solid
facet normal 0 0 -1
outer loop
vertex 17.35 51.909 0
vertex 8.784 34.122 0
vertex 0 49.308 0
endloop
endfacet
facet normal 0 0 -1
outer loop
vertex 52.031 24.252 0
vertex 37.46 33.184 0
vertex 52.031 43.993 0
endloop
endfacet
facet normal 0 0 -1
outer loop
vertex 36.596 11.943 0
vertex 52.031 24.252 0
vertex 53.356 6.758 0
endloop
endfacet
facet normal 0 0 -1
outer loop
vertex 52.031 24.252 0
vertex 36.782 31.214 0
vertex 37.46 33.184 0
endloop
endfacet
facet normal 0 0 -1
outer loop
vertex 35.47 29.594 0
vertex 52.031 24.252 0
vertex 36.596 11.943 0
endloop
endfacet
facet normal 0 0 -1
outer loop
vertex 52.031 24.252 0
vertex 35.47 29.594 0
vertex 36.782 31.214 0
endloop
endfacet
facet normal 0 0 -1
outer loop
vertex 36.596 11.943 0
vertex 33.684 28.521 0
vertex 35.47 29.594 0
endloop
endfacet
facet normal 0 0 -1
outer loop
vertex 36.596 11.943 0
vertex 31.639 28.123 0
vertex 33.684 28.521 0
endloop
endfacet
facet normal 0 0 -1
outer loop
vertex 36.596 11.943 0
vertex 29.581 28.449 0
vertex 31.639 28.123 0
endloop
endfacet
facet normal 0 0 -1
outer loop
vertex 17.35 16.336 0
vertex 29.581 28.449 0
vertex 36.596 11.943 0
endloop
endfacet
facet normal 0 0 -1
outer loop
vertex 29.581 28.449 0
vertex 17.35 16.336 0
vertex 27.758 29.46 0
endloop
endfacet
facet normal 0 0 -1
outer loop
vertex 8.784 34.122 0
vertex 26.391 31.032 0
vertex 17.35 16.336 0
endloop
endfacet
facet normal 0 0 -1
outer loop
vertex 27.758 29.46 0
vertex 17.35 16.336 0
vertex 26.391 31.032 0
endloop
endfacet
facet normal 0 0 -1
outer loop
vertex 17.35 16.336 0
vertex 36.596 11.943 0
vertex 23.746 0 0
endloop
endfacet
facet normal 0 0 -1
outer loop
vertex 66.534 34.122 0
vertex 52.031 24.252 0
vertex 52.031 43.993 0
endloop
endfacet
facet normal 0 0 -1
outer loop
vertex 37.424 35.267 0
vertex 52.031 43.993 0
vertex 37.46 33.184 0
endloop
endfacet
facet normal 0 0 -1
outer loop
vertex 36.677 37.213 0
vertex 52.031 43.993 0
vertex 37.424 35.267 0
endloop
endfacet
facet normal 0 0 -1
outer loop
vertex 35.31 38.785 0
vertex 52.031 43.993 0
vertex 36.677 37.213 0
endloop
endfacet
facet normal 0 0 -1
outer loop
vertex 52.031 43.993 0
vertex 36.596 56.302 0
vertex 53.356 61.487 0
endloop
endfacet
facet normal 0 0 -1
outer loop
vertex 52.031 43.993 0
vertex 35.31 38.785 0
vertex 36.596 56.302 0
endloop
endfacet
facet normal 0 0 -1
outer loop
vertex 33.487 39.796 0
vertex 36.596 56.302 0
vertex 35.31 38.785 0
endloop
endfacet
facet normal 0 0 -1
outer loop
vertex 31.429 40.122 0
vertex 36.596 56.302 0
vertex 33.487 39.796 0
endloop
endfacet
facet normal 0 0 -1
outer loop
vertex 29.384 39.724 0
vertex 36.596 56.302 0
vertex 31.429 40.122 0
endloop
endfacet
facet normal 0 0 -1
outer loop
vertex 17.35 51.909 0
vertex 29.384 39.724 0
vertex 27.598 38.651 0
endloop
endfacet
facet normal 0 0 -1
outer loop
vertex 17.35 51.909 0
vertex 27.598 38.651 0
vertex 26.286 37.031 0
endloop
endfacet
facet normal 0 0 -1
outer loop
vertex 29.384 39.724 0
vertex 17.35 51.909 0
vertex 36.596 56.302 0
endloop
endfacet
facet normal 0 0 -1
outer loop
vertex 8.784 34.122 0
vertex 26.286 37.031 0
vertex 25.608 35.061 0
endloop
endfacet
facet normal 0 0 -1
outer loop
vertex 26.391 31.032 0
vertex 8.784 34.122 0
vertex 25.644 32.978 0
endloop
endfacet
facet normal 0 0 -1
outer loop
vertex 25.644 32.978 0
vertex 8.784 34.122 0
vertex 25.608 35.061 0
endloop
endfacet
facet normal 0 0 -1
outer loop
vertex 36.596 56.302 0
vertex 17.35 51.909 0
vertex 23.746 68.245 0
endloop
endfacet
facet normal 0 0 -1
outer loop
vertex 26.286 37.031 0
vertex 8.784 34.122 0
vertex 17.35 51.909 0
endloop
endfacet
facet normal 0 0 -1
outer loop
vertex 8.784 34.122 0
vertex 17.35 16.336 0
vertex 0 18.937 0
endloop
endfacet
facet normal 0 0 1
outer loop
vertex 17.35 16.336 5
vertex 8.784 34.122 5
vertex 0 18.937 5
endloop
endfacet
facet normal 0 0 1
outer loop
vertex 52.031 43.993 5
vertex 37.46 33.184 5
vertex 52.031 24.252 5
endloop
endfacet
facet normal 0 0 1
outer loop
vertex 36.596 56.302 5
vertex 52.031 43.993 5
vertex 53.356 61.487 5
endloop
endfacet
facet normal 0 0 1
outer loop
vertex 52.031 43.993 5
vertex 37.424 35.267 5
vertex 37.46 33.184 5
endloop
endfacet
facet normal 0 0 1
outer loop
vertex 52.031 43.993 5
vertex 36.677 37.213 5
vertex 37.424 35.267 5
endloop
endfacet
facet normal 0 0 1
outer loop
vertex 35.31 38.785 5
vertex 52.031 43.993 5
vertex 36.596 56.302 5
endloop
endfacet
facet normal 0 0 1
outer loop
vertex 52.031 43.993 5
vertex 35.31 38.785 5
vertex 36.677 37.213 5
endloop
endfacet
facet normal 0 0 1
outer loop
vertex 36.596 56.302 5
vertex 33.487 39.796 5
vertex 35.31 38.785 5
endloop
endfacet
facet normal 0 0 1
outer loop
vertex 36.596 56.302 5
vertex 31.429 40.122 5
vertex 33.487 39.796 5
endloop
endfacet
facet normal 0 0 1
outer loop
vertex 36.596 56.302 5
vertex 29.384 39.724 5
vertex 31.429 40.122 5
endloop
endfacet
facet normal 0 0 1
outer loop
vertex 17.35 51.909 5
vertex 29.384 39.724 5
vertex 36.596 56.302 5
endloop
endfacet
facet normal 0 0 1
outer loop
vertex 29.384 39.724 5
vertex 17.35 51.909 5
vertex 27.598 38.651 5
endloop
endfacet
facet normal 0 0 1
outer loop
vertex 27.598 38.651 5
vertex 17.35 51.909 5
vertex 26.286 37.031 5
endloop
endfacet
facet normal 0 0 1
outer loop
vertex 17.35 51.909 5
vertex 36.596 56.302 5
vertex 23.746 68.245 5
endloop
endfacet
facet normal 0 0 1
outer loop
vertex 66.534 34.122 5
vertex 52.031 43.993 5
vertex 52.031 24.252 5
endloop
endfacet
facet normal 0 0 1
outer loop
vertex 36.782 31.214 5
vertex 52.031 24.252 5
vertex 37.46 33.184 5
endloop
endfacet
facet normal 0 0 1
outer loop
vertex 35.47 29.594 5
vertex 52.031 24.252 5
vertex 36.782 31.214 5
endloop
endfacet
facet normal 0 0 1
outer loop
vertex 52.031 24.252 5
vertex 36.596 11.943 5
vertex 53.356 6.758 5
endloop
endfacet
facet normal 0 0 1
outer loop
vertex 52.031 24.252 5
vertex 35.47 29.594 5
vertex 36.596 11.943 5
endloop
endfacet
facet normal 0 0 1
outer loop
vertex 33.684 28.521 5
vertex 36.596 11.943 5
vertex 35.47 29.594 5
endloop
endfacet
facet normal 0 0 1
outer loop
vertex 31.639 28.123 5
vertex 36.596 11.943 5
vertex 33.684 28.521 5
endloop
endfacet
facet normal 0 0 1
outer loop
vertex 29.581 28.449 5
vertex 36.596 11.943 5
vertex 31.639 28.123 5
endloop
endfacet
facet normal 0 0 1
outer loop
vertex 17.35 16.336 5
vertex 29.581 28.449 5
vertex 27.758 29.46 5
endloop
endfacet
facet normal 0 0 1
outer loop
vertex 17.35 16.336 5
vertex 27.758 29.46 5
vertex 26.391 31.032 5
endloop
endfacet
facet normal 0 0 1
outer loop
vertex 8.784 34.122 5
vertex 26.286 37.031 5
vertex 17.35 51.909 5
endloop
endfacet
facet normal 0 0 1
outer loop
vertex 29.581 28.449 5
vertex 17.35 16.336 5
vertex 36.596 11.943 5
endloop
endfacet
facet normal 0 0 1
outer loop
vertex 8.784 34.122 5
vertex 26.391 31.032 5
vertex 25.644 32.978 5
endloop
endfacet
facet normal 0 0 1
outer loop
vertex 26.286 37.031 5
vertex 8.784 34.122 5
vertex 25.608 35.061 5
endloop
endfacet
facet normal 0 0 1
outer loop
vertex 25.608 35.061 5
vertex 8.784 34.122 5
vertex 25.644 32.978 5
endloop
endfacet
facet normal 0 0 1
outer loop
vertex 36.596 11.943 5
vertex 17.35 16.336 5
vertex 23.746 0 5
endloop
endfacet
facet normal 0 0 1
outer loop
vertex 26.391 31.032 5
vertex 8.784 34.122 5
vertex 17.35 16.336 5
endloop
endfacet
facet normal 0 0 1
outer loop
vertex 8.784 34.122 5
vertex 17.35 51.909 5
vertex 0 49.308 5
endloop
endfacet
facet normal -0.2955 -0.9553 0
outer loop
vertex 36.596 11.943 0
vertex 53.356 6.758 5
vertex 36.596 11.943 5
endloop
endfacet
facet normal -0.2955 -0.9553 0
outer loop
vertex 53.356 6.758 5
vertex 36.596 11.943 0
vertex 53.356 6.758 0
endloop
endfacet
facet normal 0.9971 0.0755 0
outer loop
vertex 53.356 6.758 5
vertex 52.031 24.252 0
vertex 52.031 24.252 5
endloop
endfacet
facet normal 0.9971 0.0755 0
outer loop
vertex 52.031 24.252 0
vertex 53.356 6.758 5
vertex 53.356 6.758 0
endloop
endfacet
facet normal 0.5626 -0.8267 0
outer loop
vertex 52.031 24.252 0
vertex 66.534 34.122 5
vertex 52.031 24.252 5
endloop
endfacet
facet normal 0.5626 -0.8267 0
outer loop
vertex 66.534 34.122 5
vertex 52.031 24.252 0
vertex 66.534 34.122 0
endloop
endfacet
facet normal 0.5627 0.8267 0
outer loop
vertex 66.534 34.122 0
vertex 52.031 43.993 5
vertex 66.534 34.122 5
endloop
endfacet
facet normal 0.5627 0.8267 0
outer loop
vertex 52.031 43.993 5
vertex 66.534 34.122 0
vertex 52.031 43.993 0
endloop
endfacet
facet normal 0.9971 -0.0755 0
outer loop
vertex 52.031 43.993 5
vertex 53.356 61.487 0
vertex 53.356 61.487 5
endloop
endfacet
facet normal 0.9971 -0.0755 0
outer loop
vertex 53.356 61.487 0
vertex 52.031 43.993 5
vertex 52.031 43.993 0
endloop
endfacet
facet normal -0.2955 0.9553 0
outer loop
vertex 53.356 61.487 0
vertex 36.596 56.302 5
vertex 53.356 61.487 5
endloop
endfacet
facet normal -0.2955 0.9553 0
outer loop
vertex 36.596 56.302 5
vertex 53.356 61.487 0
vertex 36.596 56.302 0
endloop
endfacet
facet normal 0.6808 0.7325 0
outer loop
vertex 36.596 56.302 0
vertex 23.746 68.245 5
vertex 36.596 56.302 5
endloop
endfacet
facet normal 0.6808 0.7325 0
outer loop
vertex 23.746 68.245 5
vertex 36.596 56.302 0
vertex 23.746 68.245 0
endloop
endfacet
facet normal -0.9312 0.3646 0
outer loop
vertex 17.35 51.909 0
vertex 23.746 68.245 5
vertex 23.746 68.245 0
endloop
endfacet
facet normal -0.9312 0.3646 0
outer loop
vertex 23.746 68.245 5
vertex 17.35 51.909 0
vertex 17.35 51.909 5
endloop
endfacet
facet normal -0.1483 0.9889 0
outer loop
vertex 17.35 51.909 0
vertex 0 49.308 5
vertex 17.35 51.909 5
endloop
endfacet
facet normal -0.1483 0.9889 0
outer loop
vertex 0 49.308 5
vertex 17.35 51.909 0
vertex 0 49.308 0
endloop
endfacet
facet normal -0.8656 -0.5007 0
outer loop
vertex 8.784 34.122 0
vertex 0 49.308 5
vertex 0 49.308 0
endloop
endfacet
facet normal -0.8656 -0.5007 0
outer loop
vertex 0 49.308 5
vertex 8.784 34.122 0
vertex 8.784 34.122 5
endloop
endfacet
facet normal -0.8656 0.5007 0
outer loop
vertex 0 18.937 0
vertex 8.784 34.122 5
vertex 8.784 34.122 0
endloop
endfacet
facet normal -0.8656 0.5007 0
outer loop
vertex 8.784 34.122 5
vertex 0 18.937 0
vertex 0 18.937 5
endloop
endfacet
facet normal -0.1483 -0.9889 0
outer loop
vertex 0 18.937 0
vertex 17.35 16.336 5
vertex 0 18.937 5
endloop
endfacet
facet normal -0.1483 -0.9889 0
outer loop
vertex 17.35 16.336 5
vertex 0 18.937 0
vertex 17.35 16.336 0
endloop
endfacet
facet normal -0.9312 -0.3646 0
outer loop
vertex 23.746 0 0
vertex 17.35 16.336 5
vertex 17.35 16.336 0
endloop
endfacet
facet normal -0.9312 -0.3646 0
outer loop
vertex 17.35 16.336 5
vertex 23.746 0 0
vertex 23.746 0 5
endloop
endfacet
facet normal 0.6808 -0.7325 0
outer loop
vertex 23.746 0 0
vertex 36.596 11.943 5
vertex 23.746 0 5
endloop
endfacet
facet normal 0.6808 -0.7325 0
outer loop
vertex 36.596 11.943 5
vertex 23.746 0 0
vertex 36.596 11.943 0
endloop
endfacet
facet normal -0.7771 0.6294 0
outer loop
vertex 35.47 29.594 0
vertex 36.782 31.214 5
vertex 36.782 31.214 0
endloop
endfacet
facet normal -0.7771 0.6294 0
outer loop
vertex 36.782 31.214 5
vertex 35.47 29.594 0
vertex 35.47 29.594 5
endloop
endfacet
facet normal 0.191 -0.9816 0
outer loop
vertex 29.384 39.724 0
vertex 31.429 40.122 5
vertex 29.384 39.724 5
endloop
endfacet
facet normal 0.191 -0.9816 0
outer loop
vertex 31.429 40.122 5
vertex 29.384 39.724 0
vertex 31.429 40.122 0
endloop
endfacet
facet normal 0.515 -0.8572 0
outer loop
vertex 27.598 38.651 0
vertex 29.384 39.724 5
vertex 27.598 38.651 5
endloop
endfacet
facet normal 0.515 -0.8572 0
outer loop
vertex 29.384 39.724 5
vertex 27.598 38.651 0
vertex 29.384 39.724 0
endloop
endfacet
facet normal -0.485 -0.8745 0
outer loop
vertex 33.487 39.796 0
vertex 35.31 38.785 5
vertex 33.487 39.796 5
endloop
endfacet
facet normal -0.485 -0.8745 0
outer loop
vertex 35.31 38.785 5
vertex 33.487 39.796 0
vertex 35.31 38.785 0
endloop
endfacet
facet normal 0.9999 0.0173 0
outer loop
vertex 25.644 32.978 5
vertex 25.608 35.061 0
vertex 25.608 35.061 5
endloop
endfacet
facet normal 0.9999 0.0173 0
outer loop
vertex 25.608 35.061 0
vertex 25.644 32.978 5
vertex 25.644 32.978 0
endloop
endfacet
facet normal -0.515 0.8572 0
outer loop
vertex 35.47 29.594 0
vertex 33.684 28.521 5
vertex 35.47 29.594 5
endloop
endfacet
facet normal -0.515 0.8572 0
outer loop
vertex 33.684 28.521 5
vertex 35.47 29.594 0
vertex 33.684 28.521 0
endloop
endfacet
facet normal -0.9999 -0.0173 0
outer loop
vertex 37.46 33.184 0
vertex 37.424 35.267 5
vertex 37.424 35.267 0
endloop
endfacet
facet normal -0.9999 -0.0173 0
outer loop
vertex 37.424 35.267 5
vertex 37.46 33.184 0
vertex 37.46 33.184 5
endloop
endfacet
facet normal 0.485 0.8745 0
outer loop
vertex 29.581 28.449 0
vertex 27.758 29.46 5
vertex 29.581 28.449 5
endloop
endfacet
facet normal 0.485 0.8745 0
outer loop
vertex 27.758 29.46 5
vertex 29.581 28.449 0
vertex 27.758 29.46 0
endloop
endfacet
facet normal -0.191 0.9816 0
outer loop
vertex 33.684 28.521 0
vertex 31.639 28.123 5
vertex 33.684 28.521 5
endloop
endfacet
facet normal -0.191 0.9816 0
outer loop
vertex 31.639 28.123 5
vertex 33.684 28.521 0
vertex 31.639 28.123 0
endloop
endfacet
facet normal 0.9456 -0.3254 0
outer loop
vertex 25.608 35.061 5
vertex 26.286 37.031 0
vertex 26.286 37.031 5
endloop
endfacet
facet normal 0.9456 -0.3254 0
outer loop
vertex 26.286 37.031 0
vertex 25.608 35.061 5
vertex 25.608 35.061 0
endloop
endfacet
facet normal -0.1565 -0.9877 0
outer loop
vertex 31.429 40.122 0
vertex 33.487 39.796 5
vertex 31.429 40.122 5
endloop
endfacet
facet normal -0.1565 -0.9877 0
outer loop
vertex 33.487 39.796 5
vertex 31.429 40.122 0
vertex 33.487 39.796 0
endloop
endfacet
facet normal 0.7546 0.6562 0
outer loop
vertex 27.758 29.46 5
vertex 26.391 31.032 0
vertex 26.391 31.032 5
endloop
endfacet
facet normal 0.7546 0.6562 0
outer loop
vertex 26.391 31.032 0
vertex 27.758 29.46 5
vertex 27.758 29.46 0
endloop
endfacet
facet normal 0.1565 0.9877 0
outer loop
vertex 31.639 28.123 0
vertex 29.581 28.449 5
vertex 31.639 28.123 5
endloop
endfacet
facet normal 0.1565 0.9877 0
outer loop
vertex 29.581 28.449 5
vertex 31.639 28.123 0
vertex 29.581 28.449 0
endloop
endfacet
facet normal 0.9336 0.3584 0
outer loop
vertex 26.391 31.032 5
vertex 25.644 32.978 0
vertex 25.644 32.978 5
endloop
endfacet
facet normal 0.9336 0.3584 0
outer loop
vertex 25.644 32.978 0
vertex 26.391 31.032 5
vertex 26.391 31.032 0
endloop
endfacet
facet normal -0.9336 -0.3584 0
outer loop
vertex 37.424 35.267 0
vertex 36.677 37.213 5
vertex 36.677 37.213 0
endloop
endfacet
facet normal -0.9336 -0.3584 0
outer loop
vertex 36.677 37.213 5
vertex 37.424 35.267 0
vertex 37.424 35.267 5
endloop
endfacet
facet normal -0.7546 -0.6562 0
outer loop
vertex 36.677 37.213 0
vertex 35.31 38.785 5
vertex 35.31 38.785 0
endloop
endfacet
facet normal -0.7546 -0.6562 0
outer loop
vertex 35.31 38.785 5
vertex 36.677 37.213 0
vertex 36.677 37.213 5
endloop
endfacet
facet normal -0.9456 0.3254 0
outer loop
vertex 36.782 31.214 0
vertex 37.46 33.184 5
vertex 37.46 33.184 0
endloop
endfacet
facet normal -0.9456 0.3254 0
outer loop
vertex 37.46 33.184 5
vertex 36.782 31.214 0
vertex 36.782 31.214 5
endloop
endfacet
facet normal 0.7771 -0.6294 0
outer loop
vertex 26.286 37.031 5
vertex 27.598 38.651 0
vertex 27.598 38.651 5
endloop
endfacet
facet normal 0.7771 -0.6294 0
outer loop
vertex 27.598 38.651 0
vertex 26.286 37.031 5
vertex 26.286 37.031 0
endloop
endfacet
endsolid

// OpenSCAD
$fn = 32;

// ----------------------------------------------------------------------
// Star wheel: 7-point blunt, R35
// ----------------------------------------------------------------------

// --- parameters (mm) ---
n_points = 7;             // number of points / teeth
r_out = 35;               // tip radius
r_in = 22.75;             // root radius
bore_r = 6;               // centre bore radius
plate_t = 5;              // plate thickness, Z (extrusion height)
bore_d = 12;              // centre bore diameter

profile = [[66.534, 34.122], [52.031, 43.993], [53.356, 61.487], [36.596, 56.302], [23.746, 68.245], [17.35, 51.909], [0, 49.308], [8.784, 34.122], [0, 18.937], [17.35, 16.336], [23.746, 0], [36.596, 11.943], [53.356, 6.758], [52.031, 24.252]];  // primary outline, 14 points, counter clockwise
void_1 = [[37.424, 35.267], [36.677, 37.213], [35.31, 38.785], [33.487, 39.796], [31.429, 40.122], [29.384, 39.724], [27.598, 38.651], [26.286, 37.031], [25.608, 35.061], [25.644, 32.978], [26.391, 31.032], [27.758, 29.46], [29.581, 28.449], [31.639, 28.123], [33.684, 28.521], [35.47, 29.594], [36.782, 31.214], [37.46, 33.184]];  // centre bore, 18 points

// --- the one profile operation ---
difference() {
  linear_extrude(height = plate_t) polygon(points = profile);
  translate([0, 0, -1])
    linear_extrude(height = plate_t + 2) polygon(points = void_1);
}
